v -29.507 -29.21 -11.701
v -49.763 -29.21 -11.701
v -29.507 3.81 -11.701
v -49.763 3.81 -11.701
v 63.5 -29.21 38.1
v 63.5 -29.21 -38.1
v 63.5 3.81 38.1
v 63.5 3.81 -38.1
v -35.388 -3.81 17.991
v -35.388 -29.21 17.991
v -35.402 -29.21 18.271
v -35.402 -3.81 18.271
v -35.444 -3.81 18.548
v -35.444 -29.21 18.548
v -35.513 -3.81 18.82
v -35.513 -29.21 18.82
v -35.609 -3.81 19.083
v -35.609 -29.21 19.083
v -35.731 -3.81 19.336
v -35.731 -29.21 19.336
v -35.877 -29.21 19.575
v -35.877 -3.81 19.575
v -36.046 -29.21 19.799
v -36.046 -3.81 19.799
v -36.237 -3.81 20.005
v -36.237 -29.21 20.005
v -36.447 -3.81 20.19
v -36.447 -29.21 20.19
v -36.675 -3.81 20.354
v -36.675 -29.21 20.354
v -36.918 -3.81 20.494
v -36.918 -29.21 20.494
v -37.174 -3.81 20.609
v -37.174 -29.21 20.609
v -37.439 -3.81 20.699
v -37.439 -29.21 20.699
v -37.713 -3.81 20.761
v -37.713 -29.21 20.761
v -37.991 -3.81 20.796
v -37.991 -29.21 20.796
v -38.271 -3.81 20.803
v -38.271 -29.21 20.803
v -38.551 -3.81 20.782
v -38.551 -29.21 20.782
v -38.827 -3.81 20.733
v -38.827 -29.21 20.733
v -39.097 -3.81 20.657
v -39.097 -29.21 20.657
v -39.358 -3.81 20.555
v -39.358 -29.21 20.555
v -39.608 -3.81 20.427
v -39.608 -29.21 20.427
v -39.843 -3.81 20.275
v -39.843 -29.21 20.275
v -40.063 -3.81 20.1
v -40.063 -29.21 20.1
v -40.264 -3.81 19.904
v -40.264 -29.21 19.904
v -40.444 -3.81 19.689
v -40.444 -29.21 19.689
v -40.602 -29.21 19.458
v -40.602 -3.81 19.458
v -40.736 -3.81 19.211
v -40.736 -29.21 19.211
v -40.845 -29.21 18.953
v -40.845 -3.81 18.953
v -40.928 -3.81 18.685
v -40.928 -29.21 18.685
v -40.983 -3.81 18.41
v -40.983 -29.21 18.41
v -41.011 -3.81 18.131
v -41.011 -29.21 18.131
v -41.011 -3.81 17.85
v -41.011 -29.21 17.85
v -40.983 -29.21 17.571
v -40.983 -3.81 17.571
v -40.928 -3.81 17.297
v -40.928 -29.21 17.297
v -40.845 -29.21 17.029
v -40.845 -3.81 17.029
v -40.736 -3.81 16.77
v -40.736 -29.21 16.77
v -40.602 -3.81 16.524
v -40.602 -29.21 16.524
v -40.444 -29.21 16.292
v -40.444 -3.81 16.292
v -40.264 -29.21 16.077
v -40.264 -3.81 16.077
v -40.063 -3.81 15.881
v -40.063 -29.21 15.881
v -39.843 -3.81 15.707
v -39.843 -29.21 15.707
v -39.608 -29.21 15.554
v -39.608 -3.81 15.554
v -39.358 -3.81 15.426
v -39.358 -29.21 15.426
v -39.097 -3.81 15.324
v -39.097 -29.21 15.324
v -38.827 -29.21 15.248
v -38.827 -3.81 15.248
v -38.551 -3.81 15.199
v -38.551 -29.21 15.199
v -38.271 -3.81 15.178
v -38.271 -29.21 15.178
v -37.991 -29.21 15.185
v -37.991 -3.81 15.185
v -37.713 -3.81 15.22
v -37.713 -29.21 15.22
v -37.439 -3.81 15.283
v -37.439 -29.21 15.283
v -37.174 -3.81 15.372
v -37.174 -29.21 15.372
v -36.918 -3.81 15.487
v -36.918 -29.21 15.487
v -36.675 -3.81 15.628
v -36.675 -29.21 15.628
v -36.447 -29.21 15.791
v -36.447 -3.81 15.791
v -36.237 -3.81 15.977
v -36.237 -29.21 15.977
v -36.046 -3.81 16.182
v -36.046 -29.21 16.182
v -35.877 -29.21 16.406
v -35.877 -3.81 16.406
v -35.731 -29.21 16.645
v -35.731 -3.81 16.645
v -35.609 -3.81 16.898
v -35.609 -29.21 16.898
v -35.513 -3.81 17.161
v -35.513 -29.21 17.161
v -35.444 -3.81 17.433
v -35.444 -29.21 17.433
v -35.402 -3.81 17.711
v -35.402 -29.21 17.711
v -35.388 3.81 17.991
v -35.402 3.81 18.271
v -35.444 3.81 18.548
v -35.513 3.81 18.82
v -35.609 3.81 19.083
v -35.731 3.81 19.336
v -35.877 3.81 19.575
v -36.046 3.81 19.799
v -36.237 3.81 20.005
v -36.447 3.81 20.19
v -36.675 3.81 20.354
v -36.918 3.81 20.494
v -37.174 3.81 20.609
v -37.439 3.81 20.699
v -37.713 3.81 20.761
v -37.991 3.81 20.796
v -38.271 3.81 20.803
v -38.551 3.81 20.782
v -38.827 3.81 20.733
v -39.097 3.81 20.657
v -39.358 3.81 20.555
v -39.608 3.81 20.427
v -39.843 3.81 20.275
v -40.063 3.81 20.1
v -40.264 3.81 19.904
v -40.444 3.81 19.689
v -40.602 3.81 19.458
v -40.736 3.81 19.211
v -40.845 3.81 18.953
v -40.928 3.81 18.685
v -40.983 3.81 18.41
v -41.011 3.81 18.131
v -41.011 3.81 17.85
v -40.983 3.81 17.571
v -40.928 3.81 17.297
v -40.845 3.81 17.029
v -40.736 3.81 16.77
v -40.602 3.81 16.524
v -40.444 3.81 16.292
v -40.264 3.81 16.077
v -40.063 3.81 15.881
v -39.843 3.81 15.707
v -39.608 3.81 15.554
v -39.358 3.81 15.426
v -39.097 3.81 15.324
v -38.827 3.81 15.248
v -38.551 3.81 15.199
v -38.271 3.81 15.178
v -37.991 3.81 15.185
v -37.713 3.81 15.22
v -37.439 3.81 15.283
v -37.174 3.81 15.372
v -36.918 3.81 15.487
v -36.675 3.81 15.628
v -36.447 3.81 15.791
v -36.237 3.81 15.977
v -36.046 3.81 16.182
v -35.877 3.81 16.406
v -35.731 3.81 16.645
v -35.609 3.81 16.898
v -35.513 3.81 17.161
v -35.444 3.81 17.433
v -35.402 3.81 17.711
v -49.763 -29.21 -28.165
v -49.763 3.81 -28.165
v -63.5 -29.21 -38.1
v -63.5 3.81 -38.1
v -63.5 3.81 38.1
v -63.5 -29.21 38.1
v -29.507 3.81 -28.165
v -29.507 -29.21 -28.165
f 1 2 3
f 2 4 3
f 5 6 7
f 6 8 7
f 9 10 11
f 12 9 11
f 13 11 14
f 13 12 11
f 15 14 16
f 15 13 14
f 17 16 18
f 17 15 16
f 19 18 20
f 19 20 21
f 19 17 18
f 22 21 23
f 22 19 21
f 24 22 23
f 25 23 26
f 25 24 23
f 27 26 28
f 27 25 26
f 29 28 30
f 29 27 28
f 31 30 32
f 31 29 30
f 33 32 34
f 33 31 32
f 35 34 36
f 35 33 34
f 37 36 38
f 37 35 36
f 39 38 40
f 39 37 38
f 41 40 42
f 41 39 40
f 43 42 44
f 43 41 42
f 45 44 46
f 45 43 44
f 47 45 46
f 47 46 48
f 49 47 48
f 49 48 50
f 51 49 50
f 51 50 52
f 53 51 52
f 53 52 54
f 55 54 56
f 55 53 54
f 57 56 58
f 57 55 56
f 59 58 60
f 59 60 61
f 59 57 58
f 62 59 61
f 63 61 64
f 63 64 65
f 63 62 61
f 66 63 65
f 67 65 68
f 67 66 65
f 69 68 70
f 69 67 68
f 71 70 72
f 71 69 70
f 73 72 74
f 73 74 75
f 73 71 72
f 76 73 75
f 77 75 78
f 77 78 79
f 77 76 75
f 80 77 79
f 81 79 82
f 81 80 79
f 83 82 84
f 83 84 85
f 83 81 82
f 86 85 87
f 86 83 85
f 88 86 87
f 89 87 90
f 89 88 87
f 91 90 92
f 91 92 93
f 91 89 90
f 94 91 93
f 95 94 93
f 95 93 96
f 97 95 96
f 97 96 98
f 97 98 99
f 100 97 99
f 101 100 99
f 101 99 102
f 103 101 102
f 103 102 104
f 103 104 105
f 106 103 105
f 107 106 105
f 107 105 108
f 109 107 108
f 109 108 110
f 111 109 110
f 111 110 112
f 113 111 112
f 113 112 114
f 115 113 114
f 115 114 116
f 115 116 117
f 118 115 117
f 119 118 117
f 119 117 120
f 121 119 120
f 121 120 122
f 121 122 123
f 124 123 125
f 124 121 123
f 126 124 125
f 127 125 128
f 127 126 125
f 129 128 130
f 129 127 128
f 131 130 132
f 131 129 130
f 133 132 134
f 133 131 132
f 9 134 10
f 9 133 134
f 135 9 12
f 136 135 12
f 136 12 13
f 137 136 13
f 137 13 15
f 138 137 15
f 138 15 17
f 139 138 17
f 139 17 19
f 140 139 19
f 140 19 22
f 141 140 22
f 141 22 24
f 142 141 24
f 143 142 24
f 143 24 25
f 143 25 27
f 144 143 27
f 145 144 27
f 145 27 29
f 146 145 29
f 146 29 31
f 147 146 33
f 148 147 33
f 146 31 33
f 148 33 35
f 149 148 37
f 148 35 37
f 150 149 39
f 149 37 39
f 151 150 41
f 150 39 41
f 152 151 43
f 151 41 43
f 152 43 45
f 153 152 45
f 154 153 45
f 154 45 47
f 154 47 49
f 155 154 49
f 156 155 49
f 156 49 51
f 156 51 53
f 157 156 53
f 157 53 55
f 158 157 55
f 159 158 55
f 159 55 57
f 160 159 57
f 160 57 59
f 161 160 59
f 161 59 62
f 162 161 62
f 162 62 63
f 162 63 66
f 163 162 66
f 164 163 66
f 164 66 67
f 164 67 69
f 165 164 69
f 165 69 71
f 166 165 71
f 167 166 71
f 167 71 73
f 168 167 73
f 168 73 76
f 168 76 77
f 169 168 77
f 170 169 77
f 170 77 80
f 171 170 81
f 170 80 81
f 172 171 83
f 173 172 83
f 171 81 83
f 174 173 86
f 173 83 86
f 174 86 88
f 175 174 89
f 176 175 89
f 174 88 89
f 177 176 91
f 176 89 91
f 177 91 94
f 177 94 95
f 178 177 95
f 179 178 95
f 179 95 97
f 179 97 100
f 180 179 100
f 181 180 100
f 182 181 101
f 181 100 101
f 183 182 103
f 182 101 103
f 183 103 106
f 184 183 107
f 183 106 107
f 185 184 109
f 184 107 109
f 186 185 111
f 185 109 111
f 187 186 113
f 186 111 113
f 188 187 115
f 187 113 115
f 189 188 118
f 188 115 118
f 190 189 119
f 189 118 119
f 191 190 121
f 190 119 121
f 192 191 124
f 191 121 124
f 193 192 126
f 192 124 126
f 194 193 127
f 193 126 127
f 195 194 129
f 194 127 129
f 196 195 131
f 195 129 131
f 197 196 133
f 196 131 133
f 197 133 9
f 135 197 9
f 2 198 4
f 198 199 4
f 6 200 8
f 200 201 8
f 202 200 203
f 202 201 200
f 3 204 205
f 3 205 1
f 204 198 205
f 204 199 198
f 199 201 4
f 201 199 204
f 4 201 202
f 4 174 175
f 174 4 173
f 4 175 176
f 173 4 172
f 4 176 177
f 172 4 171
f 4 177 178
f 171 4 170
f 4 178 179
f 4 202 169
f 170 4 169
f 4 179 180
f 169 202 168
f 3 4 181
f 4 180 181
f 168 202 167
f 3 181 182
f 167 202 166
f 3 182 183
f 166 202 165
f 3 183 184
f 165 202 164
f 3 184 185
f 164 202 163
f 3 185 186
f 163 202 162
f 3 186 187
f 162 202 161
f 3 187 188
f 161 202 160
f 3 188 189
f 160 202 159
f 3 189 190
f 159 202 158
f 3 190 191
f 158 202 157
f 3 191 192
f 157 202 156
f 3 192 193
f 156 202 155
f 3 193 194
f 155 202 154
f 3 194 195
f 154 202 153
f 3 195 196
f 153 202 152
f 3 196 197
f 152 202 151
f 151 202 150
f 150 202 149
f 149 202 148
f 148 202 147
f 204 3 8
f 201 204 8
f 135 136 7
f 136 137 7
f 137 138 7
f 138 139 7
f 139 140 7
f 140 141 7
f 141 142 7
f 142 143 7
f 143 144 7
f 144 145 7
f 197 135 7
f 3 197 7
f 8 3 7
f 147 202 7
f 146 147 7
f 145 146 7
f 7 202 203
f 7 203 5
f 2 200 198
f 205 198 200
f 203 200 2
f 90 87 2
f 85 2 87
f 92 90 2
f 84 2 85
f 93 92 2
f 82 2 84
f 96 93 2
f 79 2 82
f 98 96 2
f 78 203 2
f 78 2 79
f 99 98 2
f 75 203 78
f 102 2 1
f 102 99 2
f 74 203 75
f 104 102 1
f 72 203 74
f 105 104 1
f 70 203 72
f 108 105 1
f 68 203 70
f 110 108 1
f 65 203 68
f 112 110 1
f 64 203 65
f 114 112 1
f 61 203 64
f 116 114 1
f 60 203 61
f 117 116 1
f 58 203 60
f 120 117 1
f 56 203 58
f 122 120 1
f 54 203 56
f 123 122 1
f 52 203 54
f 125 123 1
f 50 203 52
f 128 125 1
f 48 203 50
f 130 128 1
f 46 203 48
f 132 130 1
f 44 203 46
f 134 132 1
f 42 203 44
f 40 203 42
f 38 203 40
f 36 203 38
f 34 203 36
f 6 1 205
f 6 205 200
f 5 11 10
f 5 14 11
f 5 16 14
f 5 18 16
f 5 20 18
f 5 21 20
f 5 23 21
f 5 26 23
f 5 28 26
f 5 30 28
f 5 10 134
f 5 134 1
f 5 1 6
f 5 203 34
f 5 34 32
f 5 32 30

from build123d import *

# Parameters (mm, degrees)
F0_W        = 127
F0_H        = 76.2
F1_DEPTH    = 3.81
F2_R        = 2.813188
F3_DEPTH    = 25.4
F4_W        = 20.256868
F4_H        = 16.464486
F5_DEPTH    = 101.6
F6_W        = 127
F6_H        = 76.2
F6_W_2      = 20.256868
F6_H_2      = 16.464486
F6_R        = 2.813188
F1_FACE_W   = 127
F1_FACE_H   = 76.2
F1_FACE_W_2 = 20.256868
F1_FACE_H_2 = 16.464486
F1_FACE_R   = 2.813188
F7_DEPTH    = 25.4


with BuildPart() as f1:
    # F0 (on Front) → F1 (new body, symmetric)
    with BuildSketch(Plane.XZ):
        Rectangle(F0_W, F0_H)
    extrude(amount=F1_DEPTH, both=True)

    # F2 (on face) → F3 (cut)
    with BuildSketch(Plane.XZ.offset(3.81)):
        with Locations((-38.201306, 17.990688)):
            Circle(F2_R)
    extrude(amount=-F3_DEPTH, mode=Mode.SUBTRACT)

    # F4 (on face) → F5 (cut)
    with BuildSketch(Plane.XZ.offset(3.81)):
        with Locations((-39.635011, -19.933127)):
            Rectangle(F4_W, F4_H)
    extrude(amount=-F5_DEPTH, mode=Mode.SUBTRACT)

    # F6 (on face) + F1_face (on face) → F7 (join)
    with BuildSketch(Plane.XZ.offset(3.81)):
        with BuildLine():
            ThreePointArc((-14.394957, 8.691607), (-8.89384, 14.36516), (-3.220287, 8.864043))
            Line((-3.220287, 8.864043), (-0.426287, 8.864043))
            Line((-0.426287, 8.864043), (-0.426287, 10.68467))
            Line((-0.426287, 10.68467), (-1.648593, 10.68467))
            ThreePointArc((-1.648593, 10.68467), (-8.896568, 16.185919), (-16.01037, 10.512235))
            Line((-16.01037, 10.512235), (-17.188957, 10.512235))
            Line((-17.188957, 10.512235), (-17.188957, 8.691607))
            Line((-17.188957, 8.691607), (-14.394957, 8.691607))
        make_face()
        Rectangle(F6_W, F6_H)
        with Locations((-39.635011, -19.933127)):
            Rectangle(F6_W_2, F6_H_2, mode=Mode.SUBTRACT)
        with Locations((-38.201306, 17.990688)):
            Circle(F6_R, mode=Mode.SUBTRACT)
        with BuildLine():
            Line((-0.426287, 8.864043), (-3.220287, 8.864043))
            ThreePointArc((-3.220287, 8.864043), (-8.89384, 14.36516), (-14.394957, 8.691607))
            Line((-14.394957, 8.691607), (-17.188957, 8.691607))
            Line((-17.188957, 8.691607), (-17.188957, 10.512235))
            Line((-17.188957, 10.512235), (-16.01037, 10.512235))
            ThreePointArc((-16.01037, 10.512235), (-8.896568, 16.185919), (-1.648593, 10.68467))
            Line((-1.648593, 10.68467), (-0.426287, 10.68467))
            Line((-0.426287, 10.68467), (-0.426287, 8.864043))
        make_face(mode=Mode.SUBTRACT)
    with BuildSketch(Plane.XZ.offset(3.81)):
        Rectangle(F1_FACE_W, F1_FACE_H)
        with Locations((-39.635011, -19.933127)):
            Rectangle(F1_FACE_W_2, F1_FACE_H_2, mode=Mode.SUBTRACT)
        with Locations((-38.201306, 17.990688)):
            Circle(F1_FACE_R, mode=Mode.SUBTRACT)
    extrude(amount=F7_DEPTH)


solid = f1.part
